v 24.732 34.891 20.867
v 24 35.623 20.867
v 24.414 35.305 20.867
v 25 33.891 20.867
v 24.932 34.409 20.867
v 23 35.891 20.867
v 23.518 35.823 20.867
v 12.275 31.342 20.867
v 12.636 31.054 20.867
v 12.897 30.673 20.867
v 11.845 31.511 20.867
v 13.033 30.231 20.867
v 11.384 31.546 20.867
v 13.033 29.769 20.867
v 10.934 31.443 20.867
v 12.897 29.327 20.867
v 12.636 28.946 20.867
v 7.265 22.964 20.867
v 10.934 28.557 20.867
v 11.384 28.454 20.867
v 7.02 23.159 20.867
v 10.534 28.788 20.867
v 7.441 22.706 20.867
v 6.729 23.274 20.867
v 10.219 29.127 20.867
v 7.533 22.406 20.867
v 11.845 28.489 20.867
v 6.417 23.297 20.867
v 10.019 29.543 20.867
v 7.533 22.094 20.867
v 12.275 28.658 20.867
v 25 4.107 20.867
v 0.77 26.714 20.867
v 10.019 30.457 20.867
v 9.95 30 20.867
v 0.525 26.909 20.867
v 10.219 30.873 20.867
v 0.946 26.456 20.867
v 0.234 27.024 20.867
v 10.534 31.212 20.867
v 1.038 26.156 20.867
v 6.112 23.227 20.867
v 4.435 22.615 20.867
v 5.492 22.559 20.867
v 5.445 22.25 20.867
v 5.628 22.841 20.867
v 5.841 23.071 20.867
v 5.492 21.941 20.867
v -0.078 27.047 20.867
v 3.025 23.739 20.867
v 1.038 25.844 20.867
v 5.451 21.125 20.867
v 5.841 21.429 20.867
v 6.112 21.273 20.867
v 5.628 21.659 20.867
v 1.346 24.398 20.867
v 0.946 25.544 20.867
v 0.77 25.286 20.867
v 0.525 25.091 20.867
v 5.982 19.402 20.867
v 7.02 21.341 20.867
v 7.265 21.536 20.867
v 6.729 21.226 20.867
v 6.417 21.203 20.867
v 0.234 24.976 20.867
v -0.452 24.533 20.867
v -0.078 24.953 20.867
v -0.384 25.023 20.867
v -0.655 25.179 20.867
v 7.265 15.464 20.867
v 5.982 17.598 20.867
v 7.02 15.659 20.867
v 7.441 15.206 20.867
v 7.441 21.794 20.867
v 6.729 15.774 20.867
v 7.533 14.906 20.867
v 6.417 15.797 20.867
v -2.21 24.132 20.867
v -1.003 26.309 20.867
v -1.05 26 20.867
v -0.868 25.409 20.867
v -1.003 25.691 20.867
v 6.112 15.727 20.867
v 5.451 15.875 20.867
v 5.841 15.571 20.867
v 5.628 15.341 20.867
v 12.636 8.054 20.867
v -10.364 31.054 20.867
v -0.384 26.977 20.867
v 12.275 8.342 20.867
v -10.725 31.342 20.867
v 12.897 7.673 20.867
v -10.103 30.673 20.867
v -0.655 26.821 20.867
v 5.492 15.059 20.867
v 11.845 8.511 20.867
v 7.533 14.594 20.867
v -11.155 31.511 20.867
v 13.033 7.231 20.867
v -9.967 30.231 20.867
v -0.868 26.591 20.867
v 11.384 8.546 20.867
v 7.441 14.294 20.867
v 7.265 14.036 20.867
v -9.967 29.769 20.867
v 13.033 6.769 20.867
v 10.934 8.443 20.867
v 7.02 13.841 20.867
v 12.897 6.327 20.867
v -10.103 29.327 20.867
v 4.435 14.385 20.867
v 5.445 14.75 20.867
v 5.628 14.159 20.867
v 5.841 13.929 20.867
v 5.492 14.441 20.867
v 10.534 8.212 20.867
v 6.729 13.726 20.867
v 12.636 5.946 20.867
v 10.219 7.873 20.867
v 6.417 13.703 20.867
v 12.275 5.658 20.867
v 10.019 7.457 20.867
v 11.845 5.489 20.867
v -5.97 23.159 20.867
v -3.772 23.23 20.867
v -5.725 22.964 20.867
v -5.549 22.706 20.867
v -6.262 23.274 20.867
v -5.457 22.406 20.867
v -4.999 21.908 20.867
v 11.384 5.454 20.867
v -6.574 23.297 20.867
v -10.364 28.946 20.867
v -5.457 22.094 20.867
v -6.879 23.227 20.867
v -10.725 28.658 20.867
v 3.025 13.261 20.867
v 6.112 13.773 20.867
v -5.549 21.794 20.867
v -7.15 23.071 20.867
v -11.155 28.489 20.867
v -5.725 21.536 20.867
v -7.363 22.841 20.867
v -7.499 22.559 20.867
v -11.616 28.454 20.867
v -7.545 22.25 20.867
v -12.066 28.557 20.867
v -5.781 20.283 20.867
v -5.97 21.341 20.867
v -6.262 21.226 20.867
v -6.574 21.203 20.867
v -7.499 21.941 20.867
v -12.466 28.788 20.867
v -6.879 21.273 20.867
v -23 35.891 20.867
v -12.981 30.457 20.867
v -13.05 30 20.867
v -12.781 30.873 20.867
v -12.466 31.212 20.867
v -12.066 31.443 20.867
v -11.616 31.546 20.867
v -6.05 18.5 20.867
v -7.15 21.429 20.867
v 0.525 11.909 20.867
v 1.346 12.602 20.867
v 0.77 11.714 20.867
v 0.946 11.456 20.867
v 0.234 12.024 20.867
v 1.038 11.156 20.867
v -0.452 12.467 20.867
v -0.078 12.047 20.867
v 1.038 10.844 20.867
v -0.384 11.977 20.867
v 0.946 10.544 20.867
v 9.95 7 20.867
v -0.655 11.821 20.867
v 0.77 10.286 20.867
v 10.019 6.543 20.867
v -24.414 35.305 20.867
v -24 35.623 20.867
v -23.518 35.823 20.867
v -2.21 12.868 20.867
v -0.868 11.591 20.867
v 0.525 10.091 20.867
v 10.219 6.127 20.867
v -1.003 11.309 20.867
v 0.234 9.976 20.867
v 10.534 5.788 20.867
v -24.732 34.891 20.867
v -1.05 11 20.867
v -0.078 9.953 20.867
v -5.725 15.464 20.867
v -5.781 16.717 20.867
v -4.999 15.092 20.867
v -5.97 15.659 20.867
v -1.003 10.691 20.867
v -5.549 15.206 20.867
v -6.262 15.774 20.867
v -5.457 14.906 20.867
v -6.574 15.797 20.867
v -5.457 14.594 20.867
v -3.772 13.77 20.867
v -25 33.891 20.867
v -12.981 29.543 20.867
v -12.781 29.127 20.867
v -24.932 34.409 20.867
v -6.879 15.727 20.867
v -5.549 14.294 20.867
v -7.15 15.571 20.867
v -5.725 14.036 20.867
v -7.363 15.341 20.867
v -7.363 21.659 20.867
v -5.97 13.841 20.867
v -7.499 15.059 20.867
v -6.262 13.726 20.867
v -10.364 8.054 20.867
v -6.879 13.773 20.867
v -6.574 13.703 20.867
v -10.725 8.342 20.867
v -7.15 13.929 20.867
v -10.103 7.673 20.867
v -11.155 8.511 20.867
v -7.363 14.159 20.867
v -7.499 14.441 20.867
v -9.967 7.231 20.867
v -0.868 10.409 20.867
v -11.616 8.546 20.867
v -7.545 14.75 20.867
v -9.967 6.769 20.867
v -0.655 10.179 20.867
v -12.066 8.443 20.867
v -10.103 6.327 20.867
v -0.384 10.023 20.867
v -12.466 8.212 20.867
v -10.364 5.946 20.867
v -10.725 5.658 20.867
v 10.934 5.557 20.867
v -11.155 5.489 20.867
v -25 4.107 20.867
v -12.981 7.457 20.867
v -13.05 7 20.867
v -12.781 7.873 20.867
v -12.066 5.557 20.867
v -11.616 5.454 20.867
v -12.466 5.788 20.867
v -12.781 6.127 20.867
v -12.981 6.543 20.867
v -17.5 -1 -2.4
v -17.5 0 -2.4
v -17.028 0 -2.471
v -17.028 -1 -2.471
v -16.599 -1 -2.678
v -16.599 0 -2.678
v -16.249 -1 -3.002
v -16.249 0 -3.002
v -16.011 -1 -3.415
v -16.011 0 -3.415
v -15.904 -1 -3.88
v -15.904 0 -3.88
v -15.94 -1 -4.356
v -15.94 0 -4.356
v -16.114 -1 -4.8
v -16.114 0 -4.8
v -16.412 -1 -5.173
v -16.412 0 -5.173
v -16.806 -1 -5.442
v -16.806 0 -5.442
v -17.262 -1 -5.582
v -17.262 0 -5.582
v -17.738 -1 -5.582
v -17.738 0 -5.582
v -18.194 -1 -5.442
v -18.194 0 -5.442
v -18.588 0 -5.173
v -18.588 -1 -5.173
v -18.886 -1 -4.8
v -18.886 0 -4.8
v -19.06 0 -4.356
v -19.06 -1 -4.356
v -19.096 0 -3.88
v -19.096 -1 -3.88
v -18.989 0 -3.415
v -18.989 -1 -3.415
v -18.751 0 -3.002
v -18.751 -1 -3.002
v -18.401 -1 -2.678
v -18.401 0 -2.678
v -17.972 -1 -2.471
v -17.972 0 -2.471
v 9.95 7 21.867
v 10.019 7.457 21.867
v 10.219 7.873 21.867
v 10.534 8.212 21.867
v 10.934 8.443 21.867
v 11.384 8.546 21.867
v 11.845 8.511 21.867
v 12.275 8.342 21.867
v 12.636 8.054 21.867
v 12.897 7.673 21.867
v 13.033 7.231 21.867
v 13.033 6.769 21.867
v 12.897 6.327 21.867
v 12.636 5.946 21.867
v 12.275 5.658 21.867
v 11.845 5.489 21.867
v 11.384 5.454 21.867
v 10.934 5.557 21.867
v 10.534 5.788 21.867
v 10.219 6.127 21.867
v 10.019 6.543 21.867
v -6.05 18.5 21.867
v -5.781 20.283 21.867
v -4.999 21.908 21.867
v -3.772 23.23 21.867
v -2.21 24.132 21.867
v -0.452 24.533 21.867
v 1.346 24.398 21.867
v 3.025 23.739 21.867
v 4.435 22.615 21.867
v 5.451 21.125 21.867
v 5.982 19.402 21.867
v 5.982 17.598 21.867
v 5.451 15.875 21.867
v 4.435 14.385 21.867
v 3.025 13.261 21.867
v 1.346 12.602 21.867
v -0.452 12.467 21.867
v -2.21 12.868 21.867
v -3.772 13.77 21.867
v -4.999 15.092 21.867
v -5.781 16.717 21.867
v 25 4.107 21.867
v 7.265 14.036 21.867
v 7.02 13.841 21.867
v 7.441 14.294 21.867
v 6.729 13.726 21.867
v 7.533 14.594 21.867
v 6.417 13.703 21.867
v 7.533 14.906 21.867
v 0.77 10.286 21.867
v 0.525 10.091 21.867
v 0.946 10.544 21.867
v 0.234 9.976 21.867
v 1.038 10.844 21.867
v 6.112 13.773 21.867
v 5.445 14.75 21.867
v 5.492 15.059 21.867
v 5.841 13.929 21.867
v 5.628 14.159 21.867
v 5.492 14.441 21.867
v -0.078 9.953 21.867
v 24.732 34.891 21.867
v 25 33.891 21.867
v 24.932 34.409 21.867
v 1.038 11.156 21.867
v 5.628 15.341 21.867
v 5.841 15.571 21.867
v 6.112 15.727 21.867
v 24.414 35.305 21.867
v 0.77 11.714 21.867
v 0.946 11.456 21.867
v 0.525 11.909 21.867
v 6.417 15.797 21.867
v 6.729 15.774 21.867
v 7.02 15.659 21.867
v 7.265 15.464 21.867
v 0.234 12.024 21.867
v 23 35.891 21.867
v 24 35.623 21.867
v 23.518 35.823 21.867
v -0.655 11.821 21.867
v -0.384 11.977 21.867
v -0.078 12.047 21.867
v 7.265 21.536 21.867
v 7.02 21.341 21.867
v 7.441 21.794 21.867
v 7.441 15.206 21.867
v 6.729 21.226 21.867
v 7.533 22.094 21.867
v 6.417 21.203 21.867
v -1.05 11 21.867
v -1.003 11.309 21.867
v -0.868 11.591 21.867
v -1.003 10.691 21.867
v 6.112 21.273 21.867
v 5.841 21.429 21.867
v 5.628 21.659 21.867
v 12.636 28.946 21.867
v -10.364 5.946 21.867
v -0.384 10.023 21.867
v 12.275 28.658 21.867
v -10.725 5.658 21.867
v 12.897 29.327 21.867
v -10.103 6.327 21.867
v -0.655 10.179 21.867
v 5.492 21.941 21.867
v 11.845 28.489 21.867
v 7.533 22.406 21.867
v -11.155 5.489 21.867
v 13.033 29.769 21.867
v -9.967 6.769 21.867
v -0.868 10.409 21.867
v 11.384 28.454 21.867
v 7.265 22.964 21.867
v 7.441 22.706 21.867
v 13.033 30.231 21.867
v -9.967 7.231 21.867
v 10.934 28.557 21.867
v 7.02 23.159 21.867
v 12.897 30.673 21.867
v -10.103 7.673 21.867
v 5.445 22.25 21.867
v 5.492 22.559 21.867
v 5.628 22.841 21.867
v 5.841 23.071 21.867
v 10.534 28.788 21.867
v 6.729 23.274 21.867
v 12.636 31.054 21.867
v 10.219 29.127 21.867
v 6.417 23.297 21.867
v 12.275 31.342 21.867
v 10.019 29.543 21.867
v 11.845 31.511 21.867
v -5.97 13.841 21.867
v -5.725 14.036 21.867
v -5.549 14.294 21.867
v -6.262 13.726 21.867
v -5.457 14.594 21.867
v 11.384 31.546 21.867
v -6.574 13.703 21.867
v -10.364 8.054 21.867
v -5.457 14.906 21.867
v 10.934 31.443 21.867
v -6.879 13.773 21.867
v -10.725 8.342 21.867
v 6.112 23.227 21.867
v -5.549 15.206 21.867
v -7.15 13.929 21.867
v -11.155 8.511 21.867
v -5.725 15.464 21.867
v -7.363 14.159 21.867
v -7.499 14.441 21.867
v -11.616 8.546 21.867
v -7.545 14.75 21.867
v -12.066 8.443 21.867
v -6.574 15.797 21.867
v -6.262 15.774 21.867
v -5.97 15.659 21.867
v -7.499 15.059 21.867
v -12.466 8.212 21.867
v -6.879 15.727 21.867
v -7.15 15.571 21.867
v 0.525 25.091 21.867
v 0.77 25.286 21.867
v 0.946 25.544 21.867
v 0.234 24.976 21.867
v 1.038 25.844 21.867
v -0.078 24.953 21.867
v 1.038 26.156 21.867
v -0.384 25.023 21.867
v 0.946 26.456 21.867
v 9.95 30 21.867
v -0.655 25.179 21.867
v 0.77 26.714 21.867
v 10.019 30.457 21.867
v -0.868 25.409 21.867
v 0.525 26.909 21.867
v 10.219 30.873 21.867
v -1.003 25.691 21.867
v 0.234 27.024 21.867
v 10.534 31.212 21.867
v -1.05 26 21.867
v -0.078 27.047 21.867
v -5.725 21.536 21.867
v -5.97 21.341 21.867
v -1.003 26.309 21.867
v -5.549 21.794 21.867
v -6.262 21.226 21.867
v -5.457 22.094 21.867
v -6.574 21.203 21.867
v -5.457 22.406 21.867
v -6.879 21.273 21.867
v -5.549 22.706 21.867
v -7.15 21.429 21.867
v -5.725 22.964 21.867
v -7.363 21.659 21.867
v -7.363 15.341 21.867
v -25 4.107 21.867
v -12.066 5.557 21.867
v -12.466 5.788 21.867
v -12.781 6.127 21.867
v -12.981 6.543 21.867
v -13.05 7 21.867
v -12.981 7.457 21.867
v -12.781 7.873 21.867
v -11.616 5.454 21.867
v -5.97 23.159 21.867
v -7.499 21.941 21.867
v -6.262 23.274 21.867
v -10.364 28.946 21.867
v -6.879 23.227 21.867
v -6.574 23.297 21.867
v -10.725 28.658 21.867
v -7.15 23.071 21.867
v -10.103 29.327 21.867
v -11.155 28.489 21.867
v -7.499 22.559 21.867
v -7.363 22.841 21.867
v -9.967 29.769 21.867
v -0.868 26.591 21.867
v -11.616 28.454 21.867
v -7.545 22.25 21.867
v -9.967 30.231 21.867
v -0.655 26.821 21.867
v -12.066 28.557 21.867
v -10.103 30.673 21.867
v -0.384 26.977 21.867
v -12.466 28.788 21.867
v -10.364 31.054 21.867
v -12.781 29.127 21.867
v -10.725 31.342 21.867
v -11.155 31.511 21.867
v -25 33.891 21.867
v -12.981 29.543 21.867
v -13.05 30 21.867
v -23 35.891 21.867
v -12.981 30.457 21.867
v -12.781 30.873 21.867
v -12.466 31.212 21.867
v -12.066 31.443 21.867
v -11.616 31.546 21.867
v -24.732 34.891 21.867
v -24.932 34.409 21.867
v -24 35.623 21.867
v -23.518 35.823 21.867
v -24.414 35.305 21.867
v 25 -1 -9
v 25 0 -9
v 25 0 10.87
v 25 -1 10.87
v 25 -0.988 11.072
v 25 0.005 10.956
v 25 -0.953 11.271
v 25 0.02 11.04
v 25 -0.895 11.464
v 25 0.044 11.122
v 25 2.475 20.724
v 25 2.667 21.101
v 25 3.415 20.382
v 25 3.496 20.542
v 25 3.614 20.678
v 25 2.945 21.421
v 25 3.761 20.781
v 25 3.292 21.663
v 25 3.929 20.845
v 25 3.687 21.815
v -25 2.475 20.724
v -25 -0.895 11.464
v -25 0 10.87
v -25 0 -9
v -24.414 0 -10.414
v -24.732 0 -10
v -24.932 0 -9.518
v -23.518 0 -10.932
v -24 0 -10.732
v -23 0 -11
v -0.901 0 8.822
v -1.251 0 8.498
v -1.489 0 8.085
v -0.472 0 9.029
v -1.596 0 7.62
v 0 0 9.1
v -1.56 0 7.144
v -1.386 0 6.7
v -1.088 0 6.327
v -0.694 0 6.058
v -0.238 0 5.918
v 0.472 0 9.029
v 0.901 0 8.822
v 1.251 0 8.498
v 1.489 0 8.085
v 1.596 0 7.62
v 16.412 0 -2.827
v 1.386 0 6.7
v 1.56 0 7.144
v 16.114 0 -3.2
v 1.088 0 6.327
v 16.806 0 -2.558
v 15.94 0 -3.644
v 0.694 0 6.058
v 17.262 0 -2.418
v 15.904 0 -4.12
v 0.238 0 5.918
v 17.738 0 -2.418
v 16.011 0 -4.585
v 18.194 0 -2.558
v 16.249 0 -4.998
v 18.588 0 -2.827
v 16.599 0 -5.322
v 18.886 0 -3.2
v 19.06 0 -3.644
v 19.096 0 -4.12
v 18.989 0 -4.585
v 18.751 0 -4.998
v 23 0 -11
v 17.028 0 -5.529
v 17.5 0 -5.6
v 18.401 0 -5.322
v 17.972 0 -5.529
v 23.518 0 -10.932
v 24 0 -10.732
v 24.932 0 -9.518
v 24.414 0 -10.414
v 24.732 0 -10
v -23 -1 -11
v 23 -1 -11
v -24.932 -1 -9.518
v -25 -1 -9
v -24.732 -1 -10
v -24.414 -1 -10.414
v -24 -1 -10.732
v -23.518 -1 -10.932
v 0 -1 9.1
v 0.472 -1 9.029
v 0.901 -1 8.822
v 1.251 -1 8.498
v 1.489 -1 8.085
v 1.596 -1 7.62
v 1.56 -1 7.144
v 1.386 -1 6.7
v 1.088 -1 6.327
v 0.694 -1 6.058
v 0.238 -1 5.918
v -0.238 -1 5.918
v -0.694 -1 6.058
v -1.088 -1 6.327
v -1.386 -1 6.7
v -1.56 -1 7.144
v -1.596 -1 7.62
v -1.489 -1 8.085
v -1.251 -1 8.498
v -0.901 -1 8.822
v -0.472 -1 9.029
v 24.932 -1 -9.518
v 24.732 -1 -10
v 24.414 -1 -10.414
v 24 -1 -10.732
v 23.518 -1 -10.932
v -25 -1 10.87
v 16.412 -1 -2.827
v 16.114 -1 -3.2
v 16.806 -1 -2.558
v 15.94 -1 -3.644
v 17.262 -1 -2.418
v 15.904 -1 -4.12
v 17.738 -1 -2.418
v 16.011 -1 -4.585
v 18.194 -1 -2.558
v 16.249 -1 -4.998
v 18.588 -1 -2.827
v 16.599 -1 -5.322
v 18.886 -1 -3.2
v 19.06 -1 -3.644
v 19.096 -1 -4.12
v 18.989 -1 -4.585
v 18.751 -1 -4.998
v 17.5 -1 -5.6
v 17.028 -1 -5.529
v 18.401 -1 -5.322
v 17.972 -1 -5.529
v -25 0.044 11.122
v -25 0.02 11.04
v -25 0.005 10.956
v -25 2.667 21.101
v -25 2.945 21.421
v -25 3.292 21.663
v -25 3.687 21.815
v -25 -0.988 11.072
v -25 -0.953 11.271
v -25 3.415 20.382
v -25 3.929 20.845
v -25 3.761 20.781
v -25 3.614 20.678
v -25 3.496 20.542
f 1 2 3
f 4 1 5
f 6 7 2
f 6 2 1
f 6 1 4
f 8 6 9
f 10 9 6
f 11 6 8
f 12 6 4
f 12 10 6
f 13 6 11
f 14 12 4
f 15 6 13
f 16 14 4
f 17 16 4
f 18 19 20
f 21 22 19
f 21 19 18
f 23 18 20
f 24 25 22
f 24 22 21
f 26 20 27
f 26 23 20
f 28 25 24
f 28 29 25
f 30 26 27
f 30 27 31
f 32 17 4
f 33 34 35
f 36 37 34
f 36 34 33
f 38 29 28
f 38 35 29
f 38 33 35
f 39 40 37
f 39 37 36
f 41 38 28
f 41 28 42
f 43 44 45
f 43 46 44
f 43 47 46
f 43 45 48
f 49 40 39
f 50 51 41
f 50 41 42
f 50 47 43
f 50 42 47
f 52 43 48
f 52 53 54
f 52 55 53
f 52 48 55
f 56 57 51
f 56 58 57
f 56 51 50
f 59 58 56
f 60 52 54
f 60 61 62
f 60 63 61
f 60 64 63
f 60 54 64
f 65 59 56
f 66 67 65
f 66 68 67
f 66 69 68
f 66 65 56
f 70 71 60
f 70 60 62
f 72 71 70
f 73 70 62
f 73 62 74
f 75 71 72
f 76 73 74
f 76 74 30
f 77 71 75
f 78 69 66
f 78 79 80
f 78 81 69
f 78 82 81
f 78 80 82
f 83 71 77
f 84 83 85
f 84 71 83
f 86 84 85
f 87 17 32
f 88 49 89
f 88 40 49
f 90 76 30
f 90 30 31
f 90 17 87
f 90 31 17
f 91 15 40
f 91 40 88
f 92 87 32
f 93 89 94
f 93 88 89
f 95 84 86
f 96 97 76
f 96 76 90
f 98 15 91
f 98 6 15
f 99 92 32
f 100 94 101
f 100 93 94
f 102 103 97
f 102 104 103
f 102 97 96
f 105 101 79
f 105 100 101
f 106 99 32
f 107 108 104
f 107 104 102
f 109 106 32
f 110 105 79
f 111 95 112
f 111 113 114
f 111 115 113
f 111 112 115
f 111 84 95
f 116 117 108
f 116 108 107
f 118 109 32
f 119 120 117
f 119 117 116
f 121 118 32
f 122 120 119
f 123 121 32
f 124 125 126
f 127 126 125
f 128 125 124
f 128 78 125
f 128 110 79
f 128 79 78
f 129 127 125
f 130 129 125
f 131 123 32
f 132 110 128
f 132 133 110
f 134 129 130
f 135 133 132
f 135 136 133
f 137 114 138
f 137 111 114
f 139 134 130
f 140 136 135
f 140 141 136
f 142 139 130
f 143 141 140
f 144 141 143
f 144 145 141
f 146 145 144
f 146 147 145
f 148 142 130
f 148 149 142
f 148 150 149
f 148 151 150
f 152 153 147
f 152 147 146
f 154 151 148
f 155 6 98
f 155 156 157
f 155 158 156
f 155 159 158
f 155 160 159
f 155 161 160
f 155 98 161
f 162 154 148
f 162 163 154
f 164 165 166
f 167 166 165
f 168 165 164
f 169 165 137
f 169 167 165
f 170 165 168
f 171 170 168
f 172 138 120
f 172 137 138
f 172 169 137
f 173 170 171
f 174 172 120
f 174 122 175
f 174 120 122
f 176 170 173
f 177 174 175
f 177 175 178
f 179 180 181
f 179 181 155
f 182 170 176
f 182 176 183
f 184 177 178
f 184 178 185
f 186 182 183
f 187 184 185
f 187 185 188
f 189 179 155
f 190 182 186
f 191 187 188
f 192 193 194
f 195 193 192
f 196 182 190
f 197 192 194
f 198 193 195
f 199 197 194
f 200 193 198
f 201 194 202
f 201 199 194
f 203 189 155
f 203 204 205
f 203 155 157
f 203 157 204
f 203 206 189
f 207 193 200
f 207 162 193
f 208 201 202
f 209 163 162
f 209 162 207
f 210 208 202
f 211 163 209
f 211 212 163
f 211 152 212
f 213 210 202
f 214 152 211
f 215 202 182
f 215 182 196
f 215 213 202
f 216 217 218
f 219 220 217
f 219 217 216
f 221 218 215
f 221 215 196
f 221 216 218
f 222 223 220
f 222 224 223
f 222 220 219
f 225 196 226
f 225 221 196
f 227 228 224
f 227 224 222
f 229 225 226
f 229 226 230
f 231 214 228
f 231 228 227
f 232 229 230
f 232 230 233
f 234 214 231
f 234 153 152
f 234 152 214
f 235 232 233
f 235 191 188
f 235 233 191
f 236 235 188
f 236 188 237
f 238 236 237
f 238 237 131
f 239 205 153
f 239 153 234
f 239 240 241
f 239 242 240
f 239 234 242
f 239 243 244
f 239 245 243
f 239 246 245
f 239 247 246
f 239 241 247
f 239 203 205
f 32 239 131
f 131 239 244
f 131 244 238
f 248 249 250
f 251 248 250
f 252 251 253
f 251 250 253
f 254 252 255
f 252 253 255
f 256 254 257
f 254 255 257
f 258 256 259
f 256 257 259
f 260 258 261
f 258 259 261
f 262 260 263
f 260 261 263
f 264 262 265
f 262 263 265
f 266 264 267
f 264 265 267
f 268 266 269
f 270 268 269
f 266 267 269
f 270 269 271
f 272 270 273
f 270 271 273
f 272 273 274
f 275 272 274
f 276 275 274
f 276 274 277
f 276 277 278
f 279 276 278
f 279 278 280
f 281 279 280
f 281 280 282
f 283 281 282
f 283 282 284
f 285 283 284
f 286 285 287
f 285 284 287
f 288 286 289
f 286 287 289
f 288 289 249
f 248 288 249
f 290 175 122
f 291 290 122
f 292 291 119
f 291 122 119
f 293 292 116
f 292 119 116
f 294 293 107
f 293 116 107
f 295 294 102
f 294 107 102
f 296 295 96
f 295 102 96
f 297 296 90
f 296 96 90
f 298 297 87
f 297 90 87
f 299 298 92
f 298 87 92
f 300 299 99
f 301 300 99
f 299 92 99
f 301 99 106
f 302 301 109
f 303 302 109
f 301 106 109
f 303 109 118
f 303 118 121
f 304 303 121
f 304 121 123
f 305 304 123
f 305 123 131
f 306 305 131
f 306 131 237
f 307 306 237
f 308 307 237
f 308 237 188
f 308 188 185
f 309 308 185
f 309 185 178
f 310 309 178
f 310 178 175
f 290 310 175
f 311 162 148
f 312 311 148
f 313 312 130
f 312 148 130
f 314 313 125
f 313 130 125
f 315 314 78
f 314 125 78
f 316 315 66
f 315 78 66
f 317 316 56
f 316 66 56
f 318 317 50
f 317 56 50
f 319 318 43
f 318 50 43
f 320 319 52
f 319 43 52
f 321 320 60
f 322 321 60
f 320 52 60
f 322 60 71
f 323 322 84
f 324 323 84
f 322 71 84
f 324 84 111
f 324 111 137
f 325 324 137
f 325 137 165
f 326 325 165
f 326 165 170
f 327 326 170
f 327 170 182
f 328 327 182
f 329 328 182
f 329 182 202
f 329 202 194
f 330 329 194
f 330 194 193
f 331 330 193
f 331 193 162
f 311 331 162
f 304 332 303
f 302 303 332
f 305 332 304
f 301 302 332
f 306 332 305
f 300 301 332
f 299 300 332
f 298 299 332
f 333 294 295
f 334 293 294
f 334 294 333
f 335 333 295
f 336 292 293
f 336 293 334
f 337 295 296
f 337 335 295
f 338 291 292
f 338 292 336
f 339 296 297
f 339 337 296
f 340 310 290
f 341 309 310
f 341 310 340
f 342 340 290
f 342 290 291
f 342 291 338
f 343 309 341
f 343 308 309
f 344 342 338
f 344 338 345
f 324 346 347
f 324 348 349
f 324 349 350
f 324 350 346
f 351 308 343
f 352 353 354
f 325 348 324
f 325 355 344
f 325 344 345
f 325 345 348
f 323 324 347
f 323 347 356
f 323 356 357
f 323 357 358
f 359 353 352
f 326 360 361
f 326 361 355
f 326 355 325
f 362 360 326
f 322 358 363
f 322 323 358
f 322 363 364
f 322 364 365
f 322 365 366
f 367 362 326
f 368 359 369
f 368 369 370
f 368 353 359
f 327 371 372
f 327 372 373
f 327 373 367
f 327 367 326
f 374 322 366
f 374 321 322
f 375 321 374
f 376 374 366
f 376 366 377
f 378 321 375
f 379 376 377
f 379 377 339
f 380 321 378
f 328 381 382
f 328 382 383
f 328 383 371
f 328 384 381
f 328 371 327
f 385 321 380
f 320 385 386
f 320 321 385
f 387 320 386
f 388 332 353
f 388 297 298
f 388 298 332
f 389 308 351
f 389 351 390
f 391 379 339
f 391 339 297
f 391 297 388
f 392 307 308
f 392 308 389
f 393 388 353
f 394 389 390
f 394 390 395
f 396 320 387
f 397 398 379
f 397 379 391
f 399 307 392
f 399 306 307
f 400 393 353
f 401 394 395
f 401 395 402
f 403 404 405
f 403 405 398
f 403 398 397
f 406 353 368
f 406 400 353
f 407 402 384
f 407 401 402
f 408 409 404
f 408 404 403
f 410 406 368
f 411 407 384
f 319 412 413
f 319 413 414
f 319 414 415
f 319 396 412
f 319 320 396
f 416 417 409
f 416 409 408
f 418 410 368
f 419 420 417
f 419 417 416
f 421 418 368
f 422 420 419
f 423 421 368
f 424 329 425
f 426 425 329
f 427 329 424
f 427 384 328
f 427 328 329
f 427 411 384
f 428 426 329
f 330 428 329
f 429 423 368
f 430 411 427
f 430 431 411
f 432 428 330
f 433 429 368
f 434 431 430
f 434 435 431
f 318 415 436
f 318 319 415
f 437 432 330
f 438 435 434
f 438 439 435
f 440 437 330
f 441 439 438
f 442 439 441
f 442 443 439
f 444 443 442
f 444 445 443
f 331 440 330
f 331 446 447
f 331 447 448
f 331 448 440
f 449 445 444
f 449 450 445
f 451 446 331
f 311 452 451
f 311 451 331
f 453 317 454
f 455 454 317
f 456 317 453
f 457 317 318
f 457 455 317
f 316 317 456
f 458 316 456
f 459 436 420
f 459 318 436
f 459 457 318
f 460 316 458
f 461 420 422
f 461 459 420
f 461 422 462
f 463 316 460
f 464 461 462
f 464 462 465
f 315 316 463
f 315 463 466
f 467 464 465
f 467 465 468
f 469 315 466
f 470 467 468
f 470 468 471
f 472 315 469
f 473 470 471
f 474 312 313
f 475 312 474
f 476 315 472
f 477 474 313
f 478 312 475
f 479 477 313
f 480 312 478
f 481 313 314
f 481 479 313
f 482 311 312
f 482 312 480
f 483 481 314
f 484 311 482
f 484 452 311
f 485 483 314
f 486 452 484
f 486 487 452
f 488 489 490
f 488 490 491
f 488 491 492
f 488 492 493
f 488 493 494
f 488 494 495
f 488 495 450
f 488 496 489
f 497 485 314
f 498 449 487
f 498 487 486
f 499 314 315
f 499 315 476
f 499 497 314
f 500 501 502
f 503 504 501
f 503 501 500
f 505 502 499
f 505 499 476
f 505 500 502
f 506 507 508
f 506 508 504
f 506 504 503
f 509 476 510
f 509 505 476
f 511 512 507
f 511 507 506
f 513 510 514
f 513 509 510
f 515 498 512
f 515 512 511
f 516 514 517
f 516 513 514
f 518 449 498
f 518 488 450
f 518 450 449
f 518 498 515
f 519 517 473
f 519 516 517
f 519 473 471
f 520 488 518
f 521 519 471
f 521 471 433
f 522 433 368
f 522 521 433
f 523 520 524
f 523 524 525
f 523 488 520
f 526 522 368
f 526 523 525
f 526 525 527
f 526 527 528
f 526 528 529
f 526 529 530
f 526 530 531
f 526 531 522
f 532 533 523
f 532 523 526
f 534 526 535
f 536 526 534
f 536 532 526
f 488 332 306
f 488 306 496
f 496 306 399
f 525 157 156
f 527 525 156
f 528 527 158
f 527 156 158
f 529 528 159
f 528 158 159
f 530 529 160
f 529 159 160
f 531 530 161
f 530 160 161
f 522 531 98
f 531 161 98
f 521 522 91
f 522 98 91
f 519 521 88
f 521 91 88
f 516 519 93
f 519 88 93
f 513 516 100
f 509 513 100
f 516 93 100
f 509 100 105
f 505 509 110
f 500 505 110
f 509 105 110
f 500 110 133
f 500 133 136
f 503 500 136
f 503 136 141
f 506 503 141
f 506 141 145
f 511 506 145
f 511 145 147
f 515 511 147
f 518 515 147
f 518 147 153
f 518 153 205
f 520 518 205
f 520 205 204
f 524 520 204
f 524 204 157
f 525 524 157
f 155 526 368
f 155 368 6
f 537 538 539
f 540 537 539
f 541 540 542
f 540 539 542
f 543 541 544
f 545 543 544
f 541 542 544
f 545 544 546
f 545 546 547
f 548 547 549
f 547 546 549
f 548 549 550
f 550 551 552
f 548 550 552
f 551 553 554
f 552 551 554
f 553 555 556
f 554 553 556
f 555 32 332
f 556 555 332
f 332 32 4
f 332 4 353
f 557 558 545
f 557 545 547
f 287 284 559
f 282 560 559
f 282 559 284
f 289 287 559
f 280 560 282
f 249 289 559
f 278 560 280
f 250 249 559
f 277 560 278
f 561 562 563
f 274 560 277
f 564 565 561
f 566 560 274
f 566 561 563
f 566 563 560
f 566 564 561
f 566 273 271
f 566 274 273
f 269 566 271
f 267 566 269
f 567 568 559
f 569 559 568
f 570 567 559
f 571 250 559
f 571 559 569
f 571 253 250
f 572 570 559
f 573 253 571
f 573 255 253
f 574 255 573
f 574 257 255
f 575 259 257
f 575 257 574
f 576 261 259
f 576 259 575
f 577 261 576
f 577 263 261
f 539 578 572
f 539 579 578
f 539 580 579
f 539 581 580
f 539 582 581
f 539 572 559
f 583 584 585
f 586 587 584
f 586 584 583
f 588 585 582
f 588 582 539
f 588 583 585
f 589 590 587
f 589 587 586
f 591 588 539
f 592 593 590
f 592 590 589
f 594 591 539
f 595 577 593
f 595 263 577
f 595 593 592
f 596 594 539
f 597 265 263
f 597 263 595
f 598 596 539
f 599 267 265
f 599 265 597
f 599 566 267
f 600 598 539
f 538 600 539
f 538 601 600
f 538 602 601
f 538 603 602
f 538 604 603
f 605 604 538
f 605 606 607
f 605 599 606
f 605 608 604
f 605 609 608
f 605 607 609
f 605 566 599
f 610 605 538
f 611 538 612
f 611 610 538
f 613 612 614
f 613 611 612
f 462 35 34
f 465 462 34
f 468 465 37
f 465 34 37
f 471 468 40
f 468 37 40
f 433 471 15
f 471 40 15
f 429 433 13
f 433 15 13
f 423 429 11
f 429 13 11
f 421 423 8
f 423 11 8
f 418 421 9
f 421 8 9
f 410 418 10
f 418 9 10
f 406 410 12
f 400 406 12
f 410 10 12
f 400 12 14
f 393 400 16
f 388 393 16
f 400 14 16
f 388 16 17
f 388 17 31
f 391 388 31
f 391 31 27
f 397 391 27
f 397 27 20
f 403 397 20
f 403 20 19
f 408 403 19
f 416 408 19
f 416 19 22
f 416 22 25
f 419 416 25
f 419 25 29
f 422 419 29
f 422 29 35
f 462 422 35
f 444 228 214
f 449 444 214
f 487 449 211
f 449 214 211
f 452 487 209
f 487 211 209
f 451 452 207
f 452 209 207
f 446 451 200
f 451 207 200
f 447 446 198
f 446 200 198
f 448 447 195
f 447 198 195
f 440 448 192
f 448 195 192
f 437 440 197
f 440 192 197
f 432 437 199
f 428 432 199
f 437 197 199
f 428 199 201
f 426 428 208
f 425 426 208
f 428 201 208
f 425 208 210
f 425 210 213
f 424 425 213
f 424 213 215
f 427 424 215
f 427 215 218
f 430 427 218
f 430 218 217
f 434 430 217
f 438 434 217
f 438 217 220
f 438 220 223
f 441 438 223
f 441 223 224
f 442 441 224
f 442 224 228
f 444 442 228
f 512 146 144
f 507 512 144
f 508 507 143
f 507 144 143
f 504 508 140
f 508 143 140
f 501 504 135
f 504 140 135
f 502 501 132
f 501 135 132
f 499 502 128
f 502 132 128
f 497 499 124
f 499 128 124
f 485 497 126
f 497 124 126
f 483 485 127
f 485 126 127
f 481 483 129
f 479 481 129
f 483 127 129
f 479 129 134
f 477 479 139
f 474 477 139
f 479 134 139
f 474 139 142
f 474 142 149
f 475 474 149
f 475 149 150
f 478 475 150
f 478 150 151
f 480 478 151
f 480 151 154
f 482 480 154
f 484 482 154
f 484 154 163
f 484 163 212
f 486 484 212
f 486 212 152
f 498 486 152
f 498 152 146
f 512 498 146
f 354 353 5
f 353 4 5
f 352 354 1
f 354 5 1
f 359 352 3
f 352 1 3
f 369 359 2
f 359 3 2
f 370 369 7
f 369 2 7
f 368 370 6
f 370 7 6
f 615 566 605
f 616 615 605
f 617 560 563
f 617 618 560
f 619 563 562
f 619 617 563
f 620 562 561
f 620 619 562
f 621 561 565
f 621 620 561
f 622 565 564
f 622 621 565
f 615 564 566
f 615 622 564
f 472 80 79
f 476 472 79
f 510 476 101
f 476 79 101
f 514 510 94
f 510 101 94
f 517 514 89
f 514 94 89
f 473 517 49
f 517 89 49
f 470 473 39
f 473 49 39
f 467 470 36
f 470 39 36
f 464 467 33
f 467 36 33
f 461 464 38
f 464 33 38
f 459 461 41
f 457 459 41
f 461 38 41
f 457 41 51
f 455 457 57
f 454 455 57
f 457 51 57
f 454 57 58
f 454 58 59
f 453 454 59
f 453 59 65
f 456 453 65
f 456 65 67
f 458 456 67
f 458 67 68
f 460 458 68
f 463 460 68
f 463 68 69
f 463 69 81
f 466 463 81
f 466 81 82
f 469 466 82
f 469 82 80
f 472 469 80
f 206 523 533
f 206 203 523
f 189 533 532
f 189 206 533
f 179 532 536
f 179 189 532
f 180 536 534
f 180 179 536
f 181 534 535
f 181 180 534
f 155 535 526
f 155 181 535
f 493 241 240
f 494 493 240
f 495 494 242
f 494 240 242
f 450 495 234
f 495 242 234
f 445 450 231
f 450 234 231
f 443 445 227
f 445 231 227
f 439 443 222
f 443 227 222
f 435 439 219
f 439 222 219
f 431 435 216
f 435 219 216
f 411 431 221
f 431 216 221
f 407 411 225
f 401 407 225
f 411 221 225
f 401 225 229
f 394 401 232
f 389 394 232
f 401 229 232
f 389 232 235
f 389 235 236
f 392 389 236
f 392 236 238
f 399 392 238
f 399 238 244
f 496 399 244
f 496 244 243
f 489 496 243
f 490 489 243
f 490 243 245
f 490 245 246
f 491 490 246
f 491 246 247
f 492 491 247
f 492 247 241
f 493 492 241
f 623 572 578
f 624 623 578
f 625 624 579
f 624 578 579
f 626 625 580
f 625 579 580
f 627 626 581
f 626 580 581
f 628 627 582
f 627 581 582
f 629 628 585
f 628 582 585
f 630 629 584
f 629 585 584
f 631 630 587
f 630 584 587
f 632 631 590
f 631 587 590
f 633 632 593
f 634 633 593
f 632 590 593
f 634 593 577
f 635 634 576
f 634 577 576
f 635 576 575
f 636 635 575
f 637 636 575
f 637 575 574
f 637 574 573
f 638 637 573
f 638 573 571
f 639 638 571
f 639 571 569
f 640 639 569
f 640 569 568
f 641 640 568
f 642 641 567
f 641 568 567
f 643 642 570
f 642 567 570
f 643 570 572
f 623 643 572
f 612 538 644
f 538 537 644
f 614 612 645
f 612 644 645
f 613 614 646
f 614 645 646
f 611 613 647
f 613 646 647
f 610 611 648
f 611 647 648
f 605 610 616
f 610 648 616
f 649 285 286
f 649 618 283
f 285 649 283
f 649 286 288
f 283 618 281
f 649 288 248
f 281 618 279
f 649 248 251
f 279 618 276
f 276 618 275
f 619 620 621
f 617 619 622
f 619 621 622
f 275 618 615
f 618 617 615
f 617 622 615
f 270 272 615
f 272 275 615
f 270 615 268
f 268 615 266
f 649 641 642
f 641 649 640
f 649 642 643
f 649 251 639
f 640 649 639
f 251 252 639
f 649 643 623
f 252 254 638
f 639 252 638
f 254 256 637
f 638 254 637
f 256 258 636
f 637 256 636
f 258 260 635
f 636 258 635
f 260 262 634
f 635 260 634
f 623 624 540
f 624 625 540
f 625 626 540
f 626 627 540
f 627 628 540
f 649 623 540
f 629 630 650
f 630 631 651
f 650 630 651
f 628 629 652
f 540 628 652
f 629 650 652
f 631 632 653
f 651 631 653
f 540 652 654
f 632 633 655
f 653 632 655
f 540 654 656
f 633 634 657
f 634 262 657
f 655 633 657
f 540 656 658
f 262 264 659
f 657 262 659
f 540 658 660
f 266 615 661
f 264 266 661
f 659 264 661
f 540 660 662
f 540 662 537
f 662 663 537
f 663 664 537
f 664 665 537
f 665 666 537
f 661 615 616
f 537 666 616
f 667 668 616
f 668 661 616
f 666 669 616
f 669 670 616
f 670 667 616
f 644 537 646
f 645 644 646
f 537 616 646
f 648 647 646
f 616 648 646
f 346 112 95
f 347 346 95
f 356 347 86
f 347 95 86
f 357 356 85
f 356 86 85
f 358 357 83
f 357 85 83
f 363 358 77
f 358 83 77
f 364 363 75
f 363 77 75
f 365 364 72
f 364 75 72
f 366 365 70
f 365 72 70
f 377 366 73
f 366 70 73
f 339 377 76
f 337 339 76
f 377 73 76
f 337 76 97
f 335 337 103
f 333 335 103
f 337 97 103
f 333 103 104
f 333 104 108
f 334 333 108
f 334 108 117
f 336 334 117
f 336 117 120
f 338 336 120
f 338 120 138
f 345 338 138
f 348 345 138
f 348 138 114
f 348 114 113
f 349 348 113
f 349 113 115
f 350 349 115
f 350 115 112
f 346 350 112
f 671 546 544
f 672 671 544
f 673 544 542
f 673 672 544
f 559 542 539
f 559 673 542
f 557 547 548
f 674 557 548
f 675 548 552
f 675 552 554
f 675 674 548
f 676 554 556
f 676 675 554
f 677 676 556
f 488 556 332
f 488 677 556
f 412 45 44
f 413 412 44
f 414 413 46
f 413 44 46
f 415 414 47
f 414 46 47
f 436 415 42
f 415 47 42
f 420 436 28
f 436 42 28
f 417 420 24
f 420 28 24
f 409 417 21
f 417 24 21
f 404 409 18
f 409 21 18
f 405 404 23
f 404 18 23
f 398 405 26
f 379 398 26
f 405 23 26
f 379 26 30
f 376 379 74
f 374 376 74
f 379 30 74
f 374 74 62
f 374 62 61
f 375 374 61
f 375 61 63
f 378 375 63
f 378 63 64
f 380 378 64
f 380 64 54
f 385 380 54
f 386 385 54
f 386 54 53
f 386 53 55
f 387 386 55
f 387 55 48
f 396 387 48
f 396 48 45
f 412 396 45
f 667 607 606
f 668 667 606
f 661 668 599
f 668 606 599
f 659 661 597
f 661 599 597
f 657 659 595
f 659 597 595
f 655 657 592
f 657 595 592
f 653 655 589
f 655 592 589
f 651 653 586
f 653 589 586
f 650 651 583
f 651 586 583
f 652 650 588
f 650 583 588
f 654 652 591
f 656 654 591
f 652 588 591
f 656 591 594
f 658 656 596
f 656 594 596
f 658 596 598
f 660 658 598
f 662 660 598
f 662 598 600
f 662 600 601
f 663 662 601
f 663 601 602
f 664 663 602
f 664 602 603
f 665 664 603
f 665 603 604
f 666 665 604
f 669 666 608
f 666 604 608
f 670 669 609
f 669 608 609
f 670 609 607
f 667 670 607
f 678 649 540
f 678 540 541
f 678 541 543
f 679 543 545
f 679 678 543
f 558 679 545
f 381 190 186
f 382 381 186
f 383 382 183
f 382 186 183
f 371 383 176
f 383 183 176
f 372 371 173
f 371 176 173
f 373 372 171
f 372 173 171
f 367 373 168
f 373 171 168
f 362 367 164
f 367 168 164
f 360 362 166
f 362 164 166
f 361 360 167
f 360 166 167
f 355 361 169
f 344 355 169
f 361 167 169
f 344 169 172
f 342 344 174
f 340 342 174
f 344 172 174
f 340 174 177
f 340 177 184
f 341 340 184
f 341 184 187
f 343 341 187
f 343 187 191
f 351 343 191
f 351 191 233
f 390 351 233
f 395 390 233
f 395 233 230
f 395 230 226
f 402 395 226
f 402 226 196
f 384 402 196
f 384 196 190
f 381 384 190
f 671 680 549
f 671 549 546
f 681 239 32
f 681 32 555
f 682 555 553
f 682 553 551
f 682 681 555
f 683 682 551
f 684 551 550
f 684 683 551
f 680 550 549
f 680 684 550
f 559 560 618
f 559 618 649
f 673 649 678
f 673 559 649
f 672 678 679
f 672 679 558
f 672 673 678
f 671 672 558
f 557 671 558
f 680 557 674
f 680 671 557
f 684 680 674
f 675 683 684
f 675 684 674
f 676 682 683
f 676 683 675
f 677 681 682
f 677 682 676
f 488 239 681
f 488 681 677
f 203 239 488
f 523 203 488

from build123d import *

# Parameters (mm, degrees)
SKETCH_1_W                       = 50
SKETCH_1_H                       = 22
SKETCH_1_R                       = 1.6
SM_BASE_FLANGE_1_DEPTH           = 1
SM_EDGE_FLANGE_5_STRIP_CUT_DEPTH = 50
SM_EDGE_FLANGE_5_DEPTH           = 50
SM_EDGE_FLANGE_4_STRIP_CUT_DEPTH = 50
SM_EDGE_FLANGE_4_DEPTH           = 50
SKETCH_9_R                       = 1.55
SKETCH_9_R_2                     = 1.05
SKETCH_9_R_3                     = 6.05
SKETCH_9_R_4                     = 4.1
CUT_EXTRUDE_1_DEPTH              = 10
FILLET_1_R                       = 2


# Sheet-metal steps are written as plain solids
with BuildPart() as part:
    # Sketch 1 → 基体-法兰1 (new body)
    with BuildSketch(Plane(origin=(0, 0, 0), x_dir=(1, 0, 0), z_dir=(0, 1, 0))):
        Rectangle(SKETCH_1_W, SKETCH_1_H)
        with Locations(Location((0, -7.5, 0), (0, 0, 270))):
            Circle(SKETCH_1_R, mode=Mode.SUBTRACT)
        with Locations(Location((-17.5, 4, 0), (0, 0, 270))):
            Circle(SKETCH_1_R, mode=Mode.SUBTRACT)
        with Locations(Location((17.5, 4, 0), (0, 0, 90))):
            Circle(SKETCH_1_R, mode=Mode.SUBTRACT)
    extrude(amount=-SM_BASE_FLANGE_1_DEPTH)

    # 边线-法兰5 strip (across the edge) → 边线-法兰5 strip cut (cut)
    with BuildSketch(Plane(origin=(-25, 0, 11), x_dir=(0, 0.9396926207859105, -0.3420201433256631), z_dir=(1, 0, 0))):
        Polygon((-2.767214854, 4.679055925), (-0.895270205, -0.464069727), (0.044422416, -0.122049584), (-1.827522233, 5.021076069), align=None)
    extrude(amount=SM_EDGE_FLANGE_5_STRIP_CUT_DEPTH, mode=Mode.SUBTRACT)

    # 边线-法兰5 section (across the edge) → 边线-法兰5 (add)
    with BuildSketch(Plane(origin=(-25, 0, 11), x_dir=(0, 0.9396926207859105, -0.3420201433256631), z_dir=(1, 0, 0))):
        with BuildLine():
            Line((-1, 0.129882454), (-1, 10.5))
            Line((-1, 10.5), (0, 10.5))
            Line((0, 10.5), (0, 0.129882454))
            ThreePointArc((0, 0.129882454), (0.011190609, 0.001973206), (0.044422416, -0.122049584))
            Line((0.044422416, -0.122049584), (-0.895270205, -0.464069727))
            ThreePointArc((-0.895270205, -0.464069727), (-0.973617144, -0.171674971), (-1, 0.129882454))
        make_face()
    extrude(amount=SM_EDGE_FLANGE_5_DEPTH)

    # 边线-法兰4 strip (across the edge) → 边线-法兰4 strip cut (cut)
    with BuildSketch(Plane(origin=(-25, 3.591211505, 20.866772518), x_dir=(0, 0, -1), z_dir=(1, 0, 0))):
        Polygon((-5.000477833, 0.755847316), (0.142647819, -1.116097333), (0.484667962, -0.176404712), (-4.65845769, 1.695539937), align=None)
    extrude(amount=SM_EDGE_FLANGE_4_STRIP_CUT_DEPTH, mode=Mode.SUBTRACT)

    # 边线-法兰4 section (across the edge) → 边线-法兰4 (add)
    with BuildSketch(Plane(origin=(-25, 3.591211505, 20.866772518), x_dir=(0, 0, -1), z_dir=(1, 0, 0))):
        with BuildLine():
            Line((-1, 0.515772873), (-1, 32.299792462))
            Line((-1, 32.299792462), (0, 32.299792462))
            Line((0, 32.299792462), (0, 0.515772873))
            ThreePointArc((0, 0.515772873), (0.133212604, 0.09327647), (0.484667962, -0.176404712))
            Line((0.484667962, -0.176404712), (0.142647819, -1.116097333))
            ThreePointArc((0.142647819, -1.116097333), (-0.68593944, -0.480299967), (-1, 0.515772873))
        make_face()
    extrude(amount=SM_EDGE_FLANGE_4_DEPTH)

    # 草图9 → 切除-拉伸1 (cut)
    # profile 1 of 12: a face of its own
    with BuildSketch(Plane(origin=(0, 0, 20.866772518), x_dir=(-1, 0, 0), z_dir=(0, 0, -1))):
        with Locations((-11.5, 30)):
            Circle(SKETCH_9_R)
    # profile 2 of 12: a face of its own
    with BuildSketch(Plane(origin=(0, 0, 20.866772518), x_dir=(-1, 0, 0), z_dir=(0, 0, -1))):
        with Locations((11.5, 30)):
            Circle(SKETCH_9_R)
    # profile 3 of 12: a face of its own
    with BuildSketch(Plane(origin=(0, 0, 20.866772518), x_dir=(-1, 0, 0), z_dir=(0, 0, -1))):
        with Locations((6.495190528, 22.25)):
            Circle(SKETCH_9_R_2)
    # profile 4 of 12: a face of its own
    with BuildSketch(Plane(origin=(0, 0, 20.866772518), x_dir=(-1, 0, 0), z_dir=(0, 0, -1))):
        with Locations((0, 26)):
            Circle(SKETCH_9_R_2)
    # profile 5 of 12: a face of its own
    with BuildSketch(Plane(origin=(0, 0, 20.866772518), x_dir=(-1, 0, 0), z_dir=(0, 0, -1))):
        with Locations((-6.495190528, 22.25)):
            Circle(SKETCH_9_R_2)
    # profile 6 of 12: a face of its own
    with BuildSketch(Plane(origin=(0, 0, 20.866772518), x_dir=(-1, 0, 0), z_dir=(0, 0, -1))):
        with Locations((-6.495190528, 14.75)):
            Circle(SKETCH_9_R_2)
    # profile 7 of 12: a face of its own
    with BuildSketch(Plane(origin=(0, 0, 20.866772518), x_dir=(-1, 0, 0), z_dir=(0, 0, -1))):
        with Locations((0, 11)):
            Circle(SKETCH_9_R_2)
    # profile 8 of 12: a face of its own
    with BuildSketch(Plane(origin=(0, 0, 20.866772518), x_dir=(-1, 0, 0), z_dir=(0, 0, -1))):
        with Locations((6.495190528, 14.75)):
            Circle(SKETCH_9_R_2)
    # profile 9 of 12: a face of its own
    with BuildSketch(Plane(origin=(0, 0, 20.866772518), x_dir=(-1, 0, 0), z_dir=(0, 0, -1))):
        with Locations((0, 18.5)):
            Circle(SKETCH_9_R_3)
        with Locations((0, 18.5)):
            Circle(SKETCH_9_R_4, mode=Mode.SUBTRACT)
    # profile 10 of 12: a face of its own
    with BuildSketch(Plane(origin=(0, 0, 20.866772518), x_dir=(-1, 0, 0), z_dir=(0, 0, -1))):
        with Locations((0, 18.5)):
            Circle(SKETCH_9_R_4)
    # profile 11 of 12: a face of its own
    with BuildSketch(Plane(origin=(0, 0, 20.866772518), x_dir=(-1, 0, 0), z_dir=(0, 0, -1))):
        with Locations((11.5, 7)):
            Circle(SKETCH_9_R)
    # profile 12 of 12: a face of its own
    with BuildSketch(Plane(origin=(0, 0, 20.866772518), x_dir=(-1, 0, 0), z_dir=(0, 0, -1))):
        with Locations((-11.5, 7)):
            Circle(SKETCH_9_R)
    extrude(amount=-CUT_EXTRUDE_1_DEPTH, mode=Mode.SUBTRACT)

    # 圆角1
    fillet_1_edges = [part.edges().sort_by_distance(p)[0] for p in [
        (-25, 35.891003967, 21.366772518),
        (-25, -0.5, -11),
        (25, -0.5, -11),
        (25, 35.891003967, 21.366772518),
    ]]
    fillet(fillet_1_edges, radius=FILLET_1_R)


solid = part.part
